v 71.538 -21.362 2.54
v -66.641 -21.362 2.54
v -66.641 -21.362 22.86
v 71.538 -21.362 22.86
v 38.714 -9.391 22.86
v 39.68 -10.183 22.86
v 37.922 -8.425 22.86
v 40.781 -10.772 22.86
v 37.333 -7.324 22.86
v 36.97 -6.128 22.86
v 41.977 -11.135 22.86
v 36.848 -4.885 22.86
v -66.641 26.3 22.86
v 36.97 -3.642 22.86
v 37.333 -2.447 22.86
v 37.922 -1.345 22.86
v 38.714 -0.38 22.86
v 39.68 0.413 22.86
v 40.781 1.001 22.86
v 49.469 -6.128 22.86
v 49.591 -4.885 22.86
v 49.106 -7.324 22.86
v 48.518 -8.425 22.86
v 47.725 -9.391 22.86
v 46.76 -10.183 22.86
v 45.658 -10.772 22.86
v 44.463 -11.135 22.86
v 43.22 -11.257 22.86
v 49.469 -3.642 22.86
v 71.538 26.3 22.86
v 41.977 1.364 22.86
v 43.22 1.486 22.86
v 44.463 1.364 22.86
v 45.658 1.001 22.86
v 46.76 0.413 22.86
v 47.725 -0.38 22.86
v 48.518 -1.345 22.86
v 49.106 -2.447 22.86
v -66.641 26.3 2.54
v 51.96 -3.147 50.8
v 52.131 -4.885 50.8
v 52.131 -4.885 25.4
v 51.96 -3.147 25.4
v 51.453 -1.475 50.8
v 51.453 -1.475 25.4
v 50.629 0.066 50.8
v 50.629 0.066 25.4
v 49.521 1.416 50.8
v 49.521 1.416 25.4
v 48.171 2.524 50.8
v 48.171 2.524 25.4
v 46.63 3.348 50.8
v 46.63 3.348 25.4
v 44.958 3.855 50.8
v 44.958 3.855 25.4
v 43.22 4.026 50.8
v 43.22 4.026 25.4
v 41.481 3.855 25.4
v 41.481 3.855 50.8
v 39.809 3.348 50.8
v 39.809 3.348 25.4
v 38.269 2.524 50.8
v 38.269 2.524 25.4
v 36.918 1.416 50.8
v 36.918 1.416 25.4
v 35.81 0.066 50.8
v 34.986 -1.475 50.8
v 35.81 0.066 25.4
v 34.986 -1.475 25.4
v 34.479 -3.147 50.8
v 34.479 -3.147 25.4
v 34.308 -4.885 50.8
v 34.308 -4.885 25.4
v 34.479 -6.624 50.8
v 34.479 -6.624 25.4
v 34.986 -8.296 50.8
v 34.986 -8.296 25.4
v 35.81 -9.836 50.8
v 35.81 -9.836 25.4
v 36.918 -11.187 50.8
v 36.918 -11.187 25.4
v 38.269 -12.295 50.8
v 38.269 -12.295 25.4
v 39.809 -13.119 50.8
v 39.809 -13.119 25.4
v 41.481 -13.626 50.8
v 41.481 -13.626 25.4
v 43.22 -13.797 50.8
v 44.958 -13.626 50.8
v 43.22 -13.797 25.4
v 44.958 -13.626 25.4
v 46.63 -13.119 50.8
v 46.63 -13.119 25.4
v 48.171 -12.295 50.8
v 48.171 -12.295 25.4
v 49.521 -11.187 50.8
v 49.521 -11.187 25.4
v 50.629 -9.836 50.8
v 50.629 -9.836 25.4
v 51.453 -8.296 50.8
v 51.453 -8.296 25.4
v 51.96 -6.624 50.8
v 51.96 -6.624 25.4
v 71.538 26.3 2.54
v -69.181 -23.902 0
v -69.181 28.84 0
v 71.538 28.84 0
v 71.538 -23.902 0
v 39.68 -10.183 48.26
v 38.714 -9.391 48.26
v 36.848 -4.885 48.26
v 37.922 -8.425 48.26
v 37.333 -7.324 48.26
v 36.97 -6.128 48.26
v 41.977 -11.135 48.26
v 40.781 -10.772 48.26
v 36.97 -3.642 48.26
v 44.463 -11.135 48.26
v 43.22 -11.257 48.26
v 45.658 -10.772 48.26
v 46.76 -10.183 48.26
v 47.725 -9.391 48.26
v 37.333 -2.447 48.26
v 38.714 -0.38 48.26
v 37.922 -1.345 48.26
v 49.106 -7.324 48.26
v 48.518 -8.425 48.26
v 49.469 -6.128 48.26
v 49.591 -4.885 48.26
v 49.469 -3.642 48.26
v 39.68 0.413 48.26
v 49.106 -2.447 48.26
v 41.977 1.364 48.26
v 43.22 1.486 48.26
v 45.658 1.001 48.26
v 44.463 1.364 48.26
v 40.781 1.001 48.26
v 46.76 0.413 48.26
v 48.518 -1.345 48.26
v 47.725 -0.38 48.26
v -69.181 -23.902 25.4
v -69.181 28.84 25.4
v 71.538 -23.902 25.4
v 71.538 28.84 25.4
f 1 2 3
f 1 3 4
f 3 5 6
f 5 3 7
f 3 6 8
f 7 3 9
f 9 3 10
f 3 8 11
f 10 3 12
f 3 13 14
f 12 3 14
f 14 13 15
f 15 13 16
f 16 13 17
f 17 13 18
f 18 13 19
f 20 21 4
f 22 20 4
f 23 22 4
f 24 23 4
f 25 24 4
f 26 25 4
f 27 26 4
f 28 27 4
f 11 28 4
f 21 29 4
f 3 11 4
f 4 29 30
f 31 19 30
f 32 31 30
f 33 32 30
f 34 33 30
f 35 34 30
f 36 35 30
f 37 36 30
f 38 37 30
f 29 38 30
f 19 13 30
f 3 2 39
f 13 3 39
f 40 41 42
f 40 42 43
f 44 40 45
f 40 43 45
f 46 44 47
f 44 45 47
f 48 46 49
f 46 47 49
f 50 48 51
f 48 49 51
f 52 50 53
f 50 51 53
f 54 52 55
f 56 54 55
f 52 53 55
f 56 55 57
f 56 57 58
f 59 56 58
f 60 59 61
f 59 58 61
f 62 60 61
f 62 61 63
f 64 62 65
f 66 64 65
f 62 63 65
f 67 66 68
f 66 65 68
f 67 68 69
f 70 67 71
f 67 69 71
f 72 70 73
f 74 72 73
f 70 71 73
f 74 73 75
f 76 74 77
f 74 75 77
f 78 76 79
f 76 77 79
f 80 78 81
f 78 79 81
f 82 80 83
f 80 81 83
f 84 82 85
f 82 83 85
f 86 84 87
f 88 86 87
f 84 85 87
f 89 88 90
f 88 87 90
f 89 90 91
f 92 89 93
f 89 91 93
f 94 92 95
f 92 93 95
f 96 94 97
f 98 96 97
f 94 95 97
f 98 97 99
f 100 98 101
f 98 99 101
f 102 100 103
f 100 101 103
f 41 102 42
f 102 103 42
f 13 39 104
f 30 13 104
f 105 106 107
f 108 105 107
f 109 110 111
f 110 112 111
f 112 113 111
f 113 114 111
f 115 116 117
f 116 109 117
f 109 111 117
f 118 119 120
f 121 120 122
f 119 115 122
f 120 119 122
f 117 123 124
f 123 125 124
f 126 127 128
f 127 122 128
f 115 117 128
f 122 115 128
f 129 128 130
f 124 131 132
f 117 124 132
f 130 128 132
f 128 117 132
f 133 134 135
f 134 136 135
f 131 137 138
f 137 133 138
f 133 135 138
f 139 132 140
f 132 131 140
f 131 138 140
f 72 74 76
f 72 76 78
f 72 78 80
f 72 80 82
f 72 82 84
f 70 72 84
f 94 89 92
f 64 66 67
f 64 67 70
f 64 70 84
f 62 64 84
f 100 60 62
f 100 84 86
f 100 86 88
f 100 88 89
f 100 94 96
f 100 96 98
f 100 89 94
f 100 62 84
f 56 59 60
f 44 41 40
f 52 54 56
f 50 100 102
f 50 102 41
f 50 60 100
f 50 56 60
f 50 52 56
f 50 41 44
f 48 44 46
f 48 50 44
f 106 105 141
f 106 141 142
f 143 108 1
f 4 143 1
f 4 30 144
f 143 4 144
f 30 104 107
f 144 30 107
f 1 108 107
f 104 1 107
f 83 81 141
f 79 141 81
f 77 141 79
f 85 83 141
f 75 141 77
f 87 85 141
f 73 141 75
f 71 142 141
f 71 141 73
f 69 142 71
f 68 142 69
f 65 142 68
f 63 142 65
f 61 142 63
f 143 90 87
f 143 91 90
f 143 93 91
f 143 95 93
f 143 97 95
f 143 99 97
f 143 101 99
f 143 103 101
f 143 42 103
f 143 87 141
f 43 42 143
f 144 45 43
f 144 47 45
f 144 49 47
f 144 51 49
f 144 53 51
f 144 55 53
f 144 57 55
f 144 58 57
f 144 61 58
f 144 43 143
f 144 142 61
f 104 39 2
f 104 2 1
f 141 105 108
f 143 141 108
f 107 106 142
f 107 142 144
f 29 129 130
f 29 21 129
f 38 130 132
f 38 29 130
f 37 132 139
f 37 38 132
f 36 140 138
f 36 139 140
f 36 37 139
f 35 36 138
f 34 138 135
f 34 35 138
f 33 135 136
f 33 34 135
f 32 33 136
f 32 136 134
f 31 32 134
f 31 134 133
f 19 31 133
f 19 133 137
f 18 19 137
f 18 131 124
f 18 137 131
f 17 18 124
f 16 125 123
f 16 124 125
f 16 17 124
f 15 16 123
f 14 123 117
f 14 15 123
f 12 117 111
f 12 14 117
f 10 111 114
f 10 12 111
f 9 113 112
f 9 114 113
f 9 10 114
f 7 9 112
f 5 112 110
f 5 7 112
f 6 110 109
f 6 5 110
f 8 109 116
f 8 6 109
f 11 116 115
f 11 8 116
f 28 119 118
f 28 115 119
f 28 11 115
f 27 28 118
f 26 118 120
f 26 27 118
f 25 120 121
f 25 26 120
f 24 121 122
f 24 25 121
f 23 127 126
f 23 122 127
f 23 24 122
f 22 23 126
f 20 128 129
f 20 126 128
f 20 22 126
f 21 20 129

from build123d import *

# Parameters (mm, degrees)
F0_W     = 140.7188475132
F0_H     = 52.7415163815
F1_DEPTH = 25.4
F2_R     = 8.9116900181
F3_DEPTH = 25.4
F4_T     = -2.54


with BuildPart() as f1:
    # F0 (on Top) → F1 (new body)
    with BuildSketch(Plane.XY):
        with Locations((1.1782646179, 2.4687517434)):
            Rectangle(F0_W, F0_H)
    extrude(amount=F1_DEPTH)

    # F2 (on face) → F3 (join)
    with BuildSketch(Plane.XY.offset(25.4)):
        with Locations((43.2196445763, -4.8853275366)):
            Circle(F2_R)
    extrude(amount=F3_DEPTH)

    # F4
    f4_openings = [f1.faces().sort_by_distance(p)[0] for p in [
        (71.537688, 2.468752, 12.7),
    ]]
    offset(amount=F4_T, openings=f4_openings, kind=Kind.INTERSECTION)


solid = f1.part
